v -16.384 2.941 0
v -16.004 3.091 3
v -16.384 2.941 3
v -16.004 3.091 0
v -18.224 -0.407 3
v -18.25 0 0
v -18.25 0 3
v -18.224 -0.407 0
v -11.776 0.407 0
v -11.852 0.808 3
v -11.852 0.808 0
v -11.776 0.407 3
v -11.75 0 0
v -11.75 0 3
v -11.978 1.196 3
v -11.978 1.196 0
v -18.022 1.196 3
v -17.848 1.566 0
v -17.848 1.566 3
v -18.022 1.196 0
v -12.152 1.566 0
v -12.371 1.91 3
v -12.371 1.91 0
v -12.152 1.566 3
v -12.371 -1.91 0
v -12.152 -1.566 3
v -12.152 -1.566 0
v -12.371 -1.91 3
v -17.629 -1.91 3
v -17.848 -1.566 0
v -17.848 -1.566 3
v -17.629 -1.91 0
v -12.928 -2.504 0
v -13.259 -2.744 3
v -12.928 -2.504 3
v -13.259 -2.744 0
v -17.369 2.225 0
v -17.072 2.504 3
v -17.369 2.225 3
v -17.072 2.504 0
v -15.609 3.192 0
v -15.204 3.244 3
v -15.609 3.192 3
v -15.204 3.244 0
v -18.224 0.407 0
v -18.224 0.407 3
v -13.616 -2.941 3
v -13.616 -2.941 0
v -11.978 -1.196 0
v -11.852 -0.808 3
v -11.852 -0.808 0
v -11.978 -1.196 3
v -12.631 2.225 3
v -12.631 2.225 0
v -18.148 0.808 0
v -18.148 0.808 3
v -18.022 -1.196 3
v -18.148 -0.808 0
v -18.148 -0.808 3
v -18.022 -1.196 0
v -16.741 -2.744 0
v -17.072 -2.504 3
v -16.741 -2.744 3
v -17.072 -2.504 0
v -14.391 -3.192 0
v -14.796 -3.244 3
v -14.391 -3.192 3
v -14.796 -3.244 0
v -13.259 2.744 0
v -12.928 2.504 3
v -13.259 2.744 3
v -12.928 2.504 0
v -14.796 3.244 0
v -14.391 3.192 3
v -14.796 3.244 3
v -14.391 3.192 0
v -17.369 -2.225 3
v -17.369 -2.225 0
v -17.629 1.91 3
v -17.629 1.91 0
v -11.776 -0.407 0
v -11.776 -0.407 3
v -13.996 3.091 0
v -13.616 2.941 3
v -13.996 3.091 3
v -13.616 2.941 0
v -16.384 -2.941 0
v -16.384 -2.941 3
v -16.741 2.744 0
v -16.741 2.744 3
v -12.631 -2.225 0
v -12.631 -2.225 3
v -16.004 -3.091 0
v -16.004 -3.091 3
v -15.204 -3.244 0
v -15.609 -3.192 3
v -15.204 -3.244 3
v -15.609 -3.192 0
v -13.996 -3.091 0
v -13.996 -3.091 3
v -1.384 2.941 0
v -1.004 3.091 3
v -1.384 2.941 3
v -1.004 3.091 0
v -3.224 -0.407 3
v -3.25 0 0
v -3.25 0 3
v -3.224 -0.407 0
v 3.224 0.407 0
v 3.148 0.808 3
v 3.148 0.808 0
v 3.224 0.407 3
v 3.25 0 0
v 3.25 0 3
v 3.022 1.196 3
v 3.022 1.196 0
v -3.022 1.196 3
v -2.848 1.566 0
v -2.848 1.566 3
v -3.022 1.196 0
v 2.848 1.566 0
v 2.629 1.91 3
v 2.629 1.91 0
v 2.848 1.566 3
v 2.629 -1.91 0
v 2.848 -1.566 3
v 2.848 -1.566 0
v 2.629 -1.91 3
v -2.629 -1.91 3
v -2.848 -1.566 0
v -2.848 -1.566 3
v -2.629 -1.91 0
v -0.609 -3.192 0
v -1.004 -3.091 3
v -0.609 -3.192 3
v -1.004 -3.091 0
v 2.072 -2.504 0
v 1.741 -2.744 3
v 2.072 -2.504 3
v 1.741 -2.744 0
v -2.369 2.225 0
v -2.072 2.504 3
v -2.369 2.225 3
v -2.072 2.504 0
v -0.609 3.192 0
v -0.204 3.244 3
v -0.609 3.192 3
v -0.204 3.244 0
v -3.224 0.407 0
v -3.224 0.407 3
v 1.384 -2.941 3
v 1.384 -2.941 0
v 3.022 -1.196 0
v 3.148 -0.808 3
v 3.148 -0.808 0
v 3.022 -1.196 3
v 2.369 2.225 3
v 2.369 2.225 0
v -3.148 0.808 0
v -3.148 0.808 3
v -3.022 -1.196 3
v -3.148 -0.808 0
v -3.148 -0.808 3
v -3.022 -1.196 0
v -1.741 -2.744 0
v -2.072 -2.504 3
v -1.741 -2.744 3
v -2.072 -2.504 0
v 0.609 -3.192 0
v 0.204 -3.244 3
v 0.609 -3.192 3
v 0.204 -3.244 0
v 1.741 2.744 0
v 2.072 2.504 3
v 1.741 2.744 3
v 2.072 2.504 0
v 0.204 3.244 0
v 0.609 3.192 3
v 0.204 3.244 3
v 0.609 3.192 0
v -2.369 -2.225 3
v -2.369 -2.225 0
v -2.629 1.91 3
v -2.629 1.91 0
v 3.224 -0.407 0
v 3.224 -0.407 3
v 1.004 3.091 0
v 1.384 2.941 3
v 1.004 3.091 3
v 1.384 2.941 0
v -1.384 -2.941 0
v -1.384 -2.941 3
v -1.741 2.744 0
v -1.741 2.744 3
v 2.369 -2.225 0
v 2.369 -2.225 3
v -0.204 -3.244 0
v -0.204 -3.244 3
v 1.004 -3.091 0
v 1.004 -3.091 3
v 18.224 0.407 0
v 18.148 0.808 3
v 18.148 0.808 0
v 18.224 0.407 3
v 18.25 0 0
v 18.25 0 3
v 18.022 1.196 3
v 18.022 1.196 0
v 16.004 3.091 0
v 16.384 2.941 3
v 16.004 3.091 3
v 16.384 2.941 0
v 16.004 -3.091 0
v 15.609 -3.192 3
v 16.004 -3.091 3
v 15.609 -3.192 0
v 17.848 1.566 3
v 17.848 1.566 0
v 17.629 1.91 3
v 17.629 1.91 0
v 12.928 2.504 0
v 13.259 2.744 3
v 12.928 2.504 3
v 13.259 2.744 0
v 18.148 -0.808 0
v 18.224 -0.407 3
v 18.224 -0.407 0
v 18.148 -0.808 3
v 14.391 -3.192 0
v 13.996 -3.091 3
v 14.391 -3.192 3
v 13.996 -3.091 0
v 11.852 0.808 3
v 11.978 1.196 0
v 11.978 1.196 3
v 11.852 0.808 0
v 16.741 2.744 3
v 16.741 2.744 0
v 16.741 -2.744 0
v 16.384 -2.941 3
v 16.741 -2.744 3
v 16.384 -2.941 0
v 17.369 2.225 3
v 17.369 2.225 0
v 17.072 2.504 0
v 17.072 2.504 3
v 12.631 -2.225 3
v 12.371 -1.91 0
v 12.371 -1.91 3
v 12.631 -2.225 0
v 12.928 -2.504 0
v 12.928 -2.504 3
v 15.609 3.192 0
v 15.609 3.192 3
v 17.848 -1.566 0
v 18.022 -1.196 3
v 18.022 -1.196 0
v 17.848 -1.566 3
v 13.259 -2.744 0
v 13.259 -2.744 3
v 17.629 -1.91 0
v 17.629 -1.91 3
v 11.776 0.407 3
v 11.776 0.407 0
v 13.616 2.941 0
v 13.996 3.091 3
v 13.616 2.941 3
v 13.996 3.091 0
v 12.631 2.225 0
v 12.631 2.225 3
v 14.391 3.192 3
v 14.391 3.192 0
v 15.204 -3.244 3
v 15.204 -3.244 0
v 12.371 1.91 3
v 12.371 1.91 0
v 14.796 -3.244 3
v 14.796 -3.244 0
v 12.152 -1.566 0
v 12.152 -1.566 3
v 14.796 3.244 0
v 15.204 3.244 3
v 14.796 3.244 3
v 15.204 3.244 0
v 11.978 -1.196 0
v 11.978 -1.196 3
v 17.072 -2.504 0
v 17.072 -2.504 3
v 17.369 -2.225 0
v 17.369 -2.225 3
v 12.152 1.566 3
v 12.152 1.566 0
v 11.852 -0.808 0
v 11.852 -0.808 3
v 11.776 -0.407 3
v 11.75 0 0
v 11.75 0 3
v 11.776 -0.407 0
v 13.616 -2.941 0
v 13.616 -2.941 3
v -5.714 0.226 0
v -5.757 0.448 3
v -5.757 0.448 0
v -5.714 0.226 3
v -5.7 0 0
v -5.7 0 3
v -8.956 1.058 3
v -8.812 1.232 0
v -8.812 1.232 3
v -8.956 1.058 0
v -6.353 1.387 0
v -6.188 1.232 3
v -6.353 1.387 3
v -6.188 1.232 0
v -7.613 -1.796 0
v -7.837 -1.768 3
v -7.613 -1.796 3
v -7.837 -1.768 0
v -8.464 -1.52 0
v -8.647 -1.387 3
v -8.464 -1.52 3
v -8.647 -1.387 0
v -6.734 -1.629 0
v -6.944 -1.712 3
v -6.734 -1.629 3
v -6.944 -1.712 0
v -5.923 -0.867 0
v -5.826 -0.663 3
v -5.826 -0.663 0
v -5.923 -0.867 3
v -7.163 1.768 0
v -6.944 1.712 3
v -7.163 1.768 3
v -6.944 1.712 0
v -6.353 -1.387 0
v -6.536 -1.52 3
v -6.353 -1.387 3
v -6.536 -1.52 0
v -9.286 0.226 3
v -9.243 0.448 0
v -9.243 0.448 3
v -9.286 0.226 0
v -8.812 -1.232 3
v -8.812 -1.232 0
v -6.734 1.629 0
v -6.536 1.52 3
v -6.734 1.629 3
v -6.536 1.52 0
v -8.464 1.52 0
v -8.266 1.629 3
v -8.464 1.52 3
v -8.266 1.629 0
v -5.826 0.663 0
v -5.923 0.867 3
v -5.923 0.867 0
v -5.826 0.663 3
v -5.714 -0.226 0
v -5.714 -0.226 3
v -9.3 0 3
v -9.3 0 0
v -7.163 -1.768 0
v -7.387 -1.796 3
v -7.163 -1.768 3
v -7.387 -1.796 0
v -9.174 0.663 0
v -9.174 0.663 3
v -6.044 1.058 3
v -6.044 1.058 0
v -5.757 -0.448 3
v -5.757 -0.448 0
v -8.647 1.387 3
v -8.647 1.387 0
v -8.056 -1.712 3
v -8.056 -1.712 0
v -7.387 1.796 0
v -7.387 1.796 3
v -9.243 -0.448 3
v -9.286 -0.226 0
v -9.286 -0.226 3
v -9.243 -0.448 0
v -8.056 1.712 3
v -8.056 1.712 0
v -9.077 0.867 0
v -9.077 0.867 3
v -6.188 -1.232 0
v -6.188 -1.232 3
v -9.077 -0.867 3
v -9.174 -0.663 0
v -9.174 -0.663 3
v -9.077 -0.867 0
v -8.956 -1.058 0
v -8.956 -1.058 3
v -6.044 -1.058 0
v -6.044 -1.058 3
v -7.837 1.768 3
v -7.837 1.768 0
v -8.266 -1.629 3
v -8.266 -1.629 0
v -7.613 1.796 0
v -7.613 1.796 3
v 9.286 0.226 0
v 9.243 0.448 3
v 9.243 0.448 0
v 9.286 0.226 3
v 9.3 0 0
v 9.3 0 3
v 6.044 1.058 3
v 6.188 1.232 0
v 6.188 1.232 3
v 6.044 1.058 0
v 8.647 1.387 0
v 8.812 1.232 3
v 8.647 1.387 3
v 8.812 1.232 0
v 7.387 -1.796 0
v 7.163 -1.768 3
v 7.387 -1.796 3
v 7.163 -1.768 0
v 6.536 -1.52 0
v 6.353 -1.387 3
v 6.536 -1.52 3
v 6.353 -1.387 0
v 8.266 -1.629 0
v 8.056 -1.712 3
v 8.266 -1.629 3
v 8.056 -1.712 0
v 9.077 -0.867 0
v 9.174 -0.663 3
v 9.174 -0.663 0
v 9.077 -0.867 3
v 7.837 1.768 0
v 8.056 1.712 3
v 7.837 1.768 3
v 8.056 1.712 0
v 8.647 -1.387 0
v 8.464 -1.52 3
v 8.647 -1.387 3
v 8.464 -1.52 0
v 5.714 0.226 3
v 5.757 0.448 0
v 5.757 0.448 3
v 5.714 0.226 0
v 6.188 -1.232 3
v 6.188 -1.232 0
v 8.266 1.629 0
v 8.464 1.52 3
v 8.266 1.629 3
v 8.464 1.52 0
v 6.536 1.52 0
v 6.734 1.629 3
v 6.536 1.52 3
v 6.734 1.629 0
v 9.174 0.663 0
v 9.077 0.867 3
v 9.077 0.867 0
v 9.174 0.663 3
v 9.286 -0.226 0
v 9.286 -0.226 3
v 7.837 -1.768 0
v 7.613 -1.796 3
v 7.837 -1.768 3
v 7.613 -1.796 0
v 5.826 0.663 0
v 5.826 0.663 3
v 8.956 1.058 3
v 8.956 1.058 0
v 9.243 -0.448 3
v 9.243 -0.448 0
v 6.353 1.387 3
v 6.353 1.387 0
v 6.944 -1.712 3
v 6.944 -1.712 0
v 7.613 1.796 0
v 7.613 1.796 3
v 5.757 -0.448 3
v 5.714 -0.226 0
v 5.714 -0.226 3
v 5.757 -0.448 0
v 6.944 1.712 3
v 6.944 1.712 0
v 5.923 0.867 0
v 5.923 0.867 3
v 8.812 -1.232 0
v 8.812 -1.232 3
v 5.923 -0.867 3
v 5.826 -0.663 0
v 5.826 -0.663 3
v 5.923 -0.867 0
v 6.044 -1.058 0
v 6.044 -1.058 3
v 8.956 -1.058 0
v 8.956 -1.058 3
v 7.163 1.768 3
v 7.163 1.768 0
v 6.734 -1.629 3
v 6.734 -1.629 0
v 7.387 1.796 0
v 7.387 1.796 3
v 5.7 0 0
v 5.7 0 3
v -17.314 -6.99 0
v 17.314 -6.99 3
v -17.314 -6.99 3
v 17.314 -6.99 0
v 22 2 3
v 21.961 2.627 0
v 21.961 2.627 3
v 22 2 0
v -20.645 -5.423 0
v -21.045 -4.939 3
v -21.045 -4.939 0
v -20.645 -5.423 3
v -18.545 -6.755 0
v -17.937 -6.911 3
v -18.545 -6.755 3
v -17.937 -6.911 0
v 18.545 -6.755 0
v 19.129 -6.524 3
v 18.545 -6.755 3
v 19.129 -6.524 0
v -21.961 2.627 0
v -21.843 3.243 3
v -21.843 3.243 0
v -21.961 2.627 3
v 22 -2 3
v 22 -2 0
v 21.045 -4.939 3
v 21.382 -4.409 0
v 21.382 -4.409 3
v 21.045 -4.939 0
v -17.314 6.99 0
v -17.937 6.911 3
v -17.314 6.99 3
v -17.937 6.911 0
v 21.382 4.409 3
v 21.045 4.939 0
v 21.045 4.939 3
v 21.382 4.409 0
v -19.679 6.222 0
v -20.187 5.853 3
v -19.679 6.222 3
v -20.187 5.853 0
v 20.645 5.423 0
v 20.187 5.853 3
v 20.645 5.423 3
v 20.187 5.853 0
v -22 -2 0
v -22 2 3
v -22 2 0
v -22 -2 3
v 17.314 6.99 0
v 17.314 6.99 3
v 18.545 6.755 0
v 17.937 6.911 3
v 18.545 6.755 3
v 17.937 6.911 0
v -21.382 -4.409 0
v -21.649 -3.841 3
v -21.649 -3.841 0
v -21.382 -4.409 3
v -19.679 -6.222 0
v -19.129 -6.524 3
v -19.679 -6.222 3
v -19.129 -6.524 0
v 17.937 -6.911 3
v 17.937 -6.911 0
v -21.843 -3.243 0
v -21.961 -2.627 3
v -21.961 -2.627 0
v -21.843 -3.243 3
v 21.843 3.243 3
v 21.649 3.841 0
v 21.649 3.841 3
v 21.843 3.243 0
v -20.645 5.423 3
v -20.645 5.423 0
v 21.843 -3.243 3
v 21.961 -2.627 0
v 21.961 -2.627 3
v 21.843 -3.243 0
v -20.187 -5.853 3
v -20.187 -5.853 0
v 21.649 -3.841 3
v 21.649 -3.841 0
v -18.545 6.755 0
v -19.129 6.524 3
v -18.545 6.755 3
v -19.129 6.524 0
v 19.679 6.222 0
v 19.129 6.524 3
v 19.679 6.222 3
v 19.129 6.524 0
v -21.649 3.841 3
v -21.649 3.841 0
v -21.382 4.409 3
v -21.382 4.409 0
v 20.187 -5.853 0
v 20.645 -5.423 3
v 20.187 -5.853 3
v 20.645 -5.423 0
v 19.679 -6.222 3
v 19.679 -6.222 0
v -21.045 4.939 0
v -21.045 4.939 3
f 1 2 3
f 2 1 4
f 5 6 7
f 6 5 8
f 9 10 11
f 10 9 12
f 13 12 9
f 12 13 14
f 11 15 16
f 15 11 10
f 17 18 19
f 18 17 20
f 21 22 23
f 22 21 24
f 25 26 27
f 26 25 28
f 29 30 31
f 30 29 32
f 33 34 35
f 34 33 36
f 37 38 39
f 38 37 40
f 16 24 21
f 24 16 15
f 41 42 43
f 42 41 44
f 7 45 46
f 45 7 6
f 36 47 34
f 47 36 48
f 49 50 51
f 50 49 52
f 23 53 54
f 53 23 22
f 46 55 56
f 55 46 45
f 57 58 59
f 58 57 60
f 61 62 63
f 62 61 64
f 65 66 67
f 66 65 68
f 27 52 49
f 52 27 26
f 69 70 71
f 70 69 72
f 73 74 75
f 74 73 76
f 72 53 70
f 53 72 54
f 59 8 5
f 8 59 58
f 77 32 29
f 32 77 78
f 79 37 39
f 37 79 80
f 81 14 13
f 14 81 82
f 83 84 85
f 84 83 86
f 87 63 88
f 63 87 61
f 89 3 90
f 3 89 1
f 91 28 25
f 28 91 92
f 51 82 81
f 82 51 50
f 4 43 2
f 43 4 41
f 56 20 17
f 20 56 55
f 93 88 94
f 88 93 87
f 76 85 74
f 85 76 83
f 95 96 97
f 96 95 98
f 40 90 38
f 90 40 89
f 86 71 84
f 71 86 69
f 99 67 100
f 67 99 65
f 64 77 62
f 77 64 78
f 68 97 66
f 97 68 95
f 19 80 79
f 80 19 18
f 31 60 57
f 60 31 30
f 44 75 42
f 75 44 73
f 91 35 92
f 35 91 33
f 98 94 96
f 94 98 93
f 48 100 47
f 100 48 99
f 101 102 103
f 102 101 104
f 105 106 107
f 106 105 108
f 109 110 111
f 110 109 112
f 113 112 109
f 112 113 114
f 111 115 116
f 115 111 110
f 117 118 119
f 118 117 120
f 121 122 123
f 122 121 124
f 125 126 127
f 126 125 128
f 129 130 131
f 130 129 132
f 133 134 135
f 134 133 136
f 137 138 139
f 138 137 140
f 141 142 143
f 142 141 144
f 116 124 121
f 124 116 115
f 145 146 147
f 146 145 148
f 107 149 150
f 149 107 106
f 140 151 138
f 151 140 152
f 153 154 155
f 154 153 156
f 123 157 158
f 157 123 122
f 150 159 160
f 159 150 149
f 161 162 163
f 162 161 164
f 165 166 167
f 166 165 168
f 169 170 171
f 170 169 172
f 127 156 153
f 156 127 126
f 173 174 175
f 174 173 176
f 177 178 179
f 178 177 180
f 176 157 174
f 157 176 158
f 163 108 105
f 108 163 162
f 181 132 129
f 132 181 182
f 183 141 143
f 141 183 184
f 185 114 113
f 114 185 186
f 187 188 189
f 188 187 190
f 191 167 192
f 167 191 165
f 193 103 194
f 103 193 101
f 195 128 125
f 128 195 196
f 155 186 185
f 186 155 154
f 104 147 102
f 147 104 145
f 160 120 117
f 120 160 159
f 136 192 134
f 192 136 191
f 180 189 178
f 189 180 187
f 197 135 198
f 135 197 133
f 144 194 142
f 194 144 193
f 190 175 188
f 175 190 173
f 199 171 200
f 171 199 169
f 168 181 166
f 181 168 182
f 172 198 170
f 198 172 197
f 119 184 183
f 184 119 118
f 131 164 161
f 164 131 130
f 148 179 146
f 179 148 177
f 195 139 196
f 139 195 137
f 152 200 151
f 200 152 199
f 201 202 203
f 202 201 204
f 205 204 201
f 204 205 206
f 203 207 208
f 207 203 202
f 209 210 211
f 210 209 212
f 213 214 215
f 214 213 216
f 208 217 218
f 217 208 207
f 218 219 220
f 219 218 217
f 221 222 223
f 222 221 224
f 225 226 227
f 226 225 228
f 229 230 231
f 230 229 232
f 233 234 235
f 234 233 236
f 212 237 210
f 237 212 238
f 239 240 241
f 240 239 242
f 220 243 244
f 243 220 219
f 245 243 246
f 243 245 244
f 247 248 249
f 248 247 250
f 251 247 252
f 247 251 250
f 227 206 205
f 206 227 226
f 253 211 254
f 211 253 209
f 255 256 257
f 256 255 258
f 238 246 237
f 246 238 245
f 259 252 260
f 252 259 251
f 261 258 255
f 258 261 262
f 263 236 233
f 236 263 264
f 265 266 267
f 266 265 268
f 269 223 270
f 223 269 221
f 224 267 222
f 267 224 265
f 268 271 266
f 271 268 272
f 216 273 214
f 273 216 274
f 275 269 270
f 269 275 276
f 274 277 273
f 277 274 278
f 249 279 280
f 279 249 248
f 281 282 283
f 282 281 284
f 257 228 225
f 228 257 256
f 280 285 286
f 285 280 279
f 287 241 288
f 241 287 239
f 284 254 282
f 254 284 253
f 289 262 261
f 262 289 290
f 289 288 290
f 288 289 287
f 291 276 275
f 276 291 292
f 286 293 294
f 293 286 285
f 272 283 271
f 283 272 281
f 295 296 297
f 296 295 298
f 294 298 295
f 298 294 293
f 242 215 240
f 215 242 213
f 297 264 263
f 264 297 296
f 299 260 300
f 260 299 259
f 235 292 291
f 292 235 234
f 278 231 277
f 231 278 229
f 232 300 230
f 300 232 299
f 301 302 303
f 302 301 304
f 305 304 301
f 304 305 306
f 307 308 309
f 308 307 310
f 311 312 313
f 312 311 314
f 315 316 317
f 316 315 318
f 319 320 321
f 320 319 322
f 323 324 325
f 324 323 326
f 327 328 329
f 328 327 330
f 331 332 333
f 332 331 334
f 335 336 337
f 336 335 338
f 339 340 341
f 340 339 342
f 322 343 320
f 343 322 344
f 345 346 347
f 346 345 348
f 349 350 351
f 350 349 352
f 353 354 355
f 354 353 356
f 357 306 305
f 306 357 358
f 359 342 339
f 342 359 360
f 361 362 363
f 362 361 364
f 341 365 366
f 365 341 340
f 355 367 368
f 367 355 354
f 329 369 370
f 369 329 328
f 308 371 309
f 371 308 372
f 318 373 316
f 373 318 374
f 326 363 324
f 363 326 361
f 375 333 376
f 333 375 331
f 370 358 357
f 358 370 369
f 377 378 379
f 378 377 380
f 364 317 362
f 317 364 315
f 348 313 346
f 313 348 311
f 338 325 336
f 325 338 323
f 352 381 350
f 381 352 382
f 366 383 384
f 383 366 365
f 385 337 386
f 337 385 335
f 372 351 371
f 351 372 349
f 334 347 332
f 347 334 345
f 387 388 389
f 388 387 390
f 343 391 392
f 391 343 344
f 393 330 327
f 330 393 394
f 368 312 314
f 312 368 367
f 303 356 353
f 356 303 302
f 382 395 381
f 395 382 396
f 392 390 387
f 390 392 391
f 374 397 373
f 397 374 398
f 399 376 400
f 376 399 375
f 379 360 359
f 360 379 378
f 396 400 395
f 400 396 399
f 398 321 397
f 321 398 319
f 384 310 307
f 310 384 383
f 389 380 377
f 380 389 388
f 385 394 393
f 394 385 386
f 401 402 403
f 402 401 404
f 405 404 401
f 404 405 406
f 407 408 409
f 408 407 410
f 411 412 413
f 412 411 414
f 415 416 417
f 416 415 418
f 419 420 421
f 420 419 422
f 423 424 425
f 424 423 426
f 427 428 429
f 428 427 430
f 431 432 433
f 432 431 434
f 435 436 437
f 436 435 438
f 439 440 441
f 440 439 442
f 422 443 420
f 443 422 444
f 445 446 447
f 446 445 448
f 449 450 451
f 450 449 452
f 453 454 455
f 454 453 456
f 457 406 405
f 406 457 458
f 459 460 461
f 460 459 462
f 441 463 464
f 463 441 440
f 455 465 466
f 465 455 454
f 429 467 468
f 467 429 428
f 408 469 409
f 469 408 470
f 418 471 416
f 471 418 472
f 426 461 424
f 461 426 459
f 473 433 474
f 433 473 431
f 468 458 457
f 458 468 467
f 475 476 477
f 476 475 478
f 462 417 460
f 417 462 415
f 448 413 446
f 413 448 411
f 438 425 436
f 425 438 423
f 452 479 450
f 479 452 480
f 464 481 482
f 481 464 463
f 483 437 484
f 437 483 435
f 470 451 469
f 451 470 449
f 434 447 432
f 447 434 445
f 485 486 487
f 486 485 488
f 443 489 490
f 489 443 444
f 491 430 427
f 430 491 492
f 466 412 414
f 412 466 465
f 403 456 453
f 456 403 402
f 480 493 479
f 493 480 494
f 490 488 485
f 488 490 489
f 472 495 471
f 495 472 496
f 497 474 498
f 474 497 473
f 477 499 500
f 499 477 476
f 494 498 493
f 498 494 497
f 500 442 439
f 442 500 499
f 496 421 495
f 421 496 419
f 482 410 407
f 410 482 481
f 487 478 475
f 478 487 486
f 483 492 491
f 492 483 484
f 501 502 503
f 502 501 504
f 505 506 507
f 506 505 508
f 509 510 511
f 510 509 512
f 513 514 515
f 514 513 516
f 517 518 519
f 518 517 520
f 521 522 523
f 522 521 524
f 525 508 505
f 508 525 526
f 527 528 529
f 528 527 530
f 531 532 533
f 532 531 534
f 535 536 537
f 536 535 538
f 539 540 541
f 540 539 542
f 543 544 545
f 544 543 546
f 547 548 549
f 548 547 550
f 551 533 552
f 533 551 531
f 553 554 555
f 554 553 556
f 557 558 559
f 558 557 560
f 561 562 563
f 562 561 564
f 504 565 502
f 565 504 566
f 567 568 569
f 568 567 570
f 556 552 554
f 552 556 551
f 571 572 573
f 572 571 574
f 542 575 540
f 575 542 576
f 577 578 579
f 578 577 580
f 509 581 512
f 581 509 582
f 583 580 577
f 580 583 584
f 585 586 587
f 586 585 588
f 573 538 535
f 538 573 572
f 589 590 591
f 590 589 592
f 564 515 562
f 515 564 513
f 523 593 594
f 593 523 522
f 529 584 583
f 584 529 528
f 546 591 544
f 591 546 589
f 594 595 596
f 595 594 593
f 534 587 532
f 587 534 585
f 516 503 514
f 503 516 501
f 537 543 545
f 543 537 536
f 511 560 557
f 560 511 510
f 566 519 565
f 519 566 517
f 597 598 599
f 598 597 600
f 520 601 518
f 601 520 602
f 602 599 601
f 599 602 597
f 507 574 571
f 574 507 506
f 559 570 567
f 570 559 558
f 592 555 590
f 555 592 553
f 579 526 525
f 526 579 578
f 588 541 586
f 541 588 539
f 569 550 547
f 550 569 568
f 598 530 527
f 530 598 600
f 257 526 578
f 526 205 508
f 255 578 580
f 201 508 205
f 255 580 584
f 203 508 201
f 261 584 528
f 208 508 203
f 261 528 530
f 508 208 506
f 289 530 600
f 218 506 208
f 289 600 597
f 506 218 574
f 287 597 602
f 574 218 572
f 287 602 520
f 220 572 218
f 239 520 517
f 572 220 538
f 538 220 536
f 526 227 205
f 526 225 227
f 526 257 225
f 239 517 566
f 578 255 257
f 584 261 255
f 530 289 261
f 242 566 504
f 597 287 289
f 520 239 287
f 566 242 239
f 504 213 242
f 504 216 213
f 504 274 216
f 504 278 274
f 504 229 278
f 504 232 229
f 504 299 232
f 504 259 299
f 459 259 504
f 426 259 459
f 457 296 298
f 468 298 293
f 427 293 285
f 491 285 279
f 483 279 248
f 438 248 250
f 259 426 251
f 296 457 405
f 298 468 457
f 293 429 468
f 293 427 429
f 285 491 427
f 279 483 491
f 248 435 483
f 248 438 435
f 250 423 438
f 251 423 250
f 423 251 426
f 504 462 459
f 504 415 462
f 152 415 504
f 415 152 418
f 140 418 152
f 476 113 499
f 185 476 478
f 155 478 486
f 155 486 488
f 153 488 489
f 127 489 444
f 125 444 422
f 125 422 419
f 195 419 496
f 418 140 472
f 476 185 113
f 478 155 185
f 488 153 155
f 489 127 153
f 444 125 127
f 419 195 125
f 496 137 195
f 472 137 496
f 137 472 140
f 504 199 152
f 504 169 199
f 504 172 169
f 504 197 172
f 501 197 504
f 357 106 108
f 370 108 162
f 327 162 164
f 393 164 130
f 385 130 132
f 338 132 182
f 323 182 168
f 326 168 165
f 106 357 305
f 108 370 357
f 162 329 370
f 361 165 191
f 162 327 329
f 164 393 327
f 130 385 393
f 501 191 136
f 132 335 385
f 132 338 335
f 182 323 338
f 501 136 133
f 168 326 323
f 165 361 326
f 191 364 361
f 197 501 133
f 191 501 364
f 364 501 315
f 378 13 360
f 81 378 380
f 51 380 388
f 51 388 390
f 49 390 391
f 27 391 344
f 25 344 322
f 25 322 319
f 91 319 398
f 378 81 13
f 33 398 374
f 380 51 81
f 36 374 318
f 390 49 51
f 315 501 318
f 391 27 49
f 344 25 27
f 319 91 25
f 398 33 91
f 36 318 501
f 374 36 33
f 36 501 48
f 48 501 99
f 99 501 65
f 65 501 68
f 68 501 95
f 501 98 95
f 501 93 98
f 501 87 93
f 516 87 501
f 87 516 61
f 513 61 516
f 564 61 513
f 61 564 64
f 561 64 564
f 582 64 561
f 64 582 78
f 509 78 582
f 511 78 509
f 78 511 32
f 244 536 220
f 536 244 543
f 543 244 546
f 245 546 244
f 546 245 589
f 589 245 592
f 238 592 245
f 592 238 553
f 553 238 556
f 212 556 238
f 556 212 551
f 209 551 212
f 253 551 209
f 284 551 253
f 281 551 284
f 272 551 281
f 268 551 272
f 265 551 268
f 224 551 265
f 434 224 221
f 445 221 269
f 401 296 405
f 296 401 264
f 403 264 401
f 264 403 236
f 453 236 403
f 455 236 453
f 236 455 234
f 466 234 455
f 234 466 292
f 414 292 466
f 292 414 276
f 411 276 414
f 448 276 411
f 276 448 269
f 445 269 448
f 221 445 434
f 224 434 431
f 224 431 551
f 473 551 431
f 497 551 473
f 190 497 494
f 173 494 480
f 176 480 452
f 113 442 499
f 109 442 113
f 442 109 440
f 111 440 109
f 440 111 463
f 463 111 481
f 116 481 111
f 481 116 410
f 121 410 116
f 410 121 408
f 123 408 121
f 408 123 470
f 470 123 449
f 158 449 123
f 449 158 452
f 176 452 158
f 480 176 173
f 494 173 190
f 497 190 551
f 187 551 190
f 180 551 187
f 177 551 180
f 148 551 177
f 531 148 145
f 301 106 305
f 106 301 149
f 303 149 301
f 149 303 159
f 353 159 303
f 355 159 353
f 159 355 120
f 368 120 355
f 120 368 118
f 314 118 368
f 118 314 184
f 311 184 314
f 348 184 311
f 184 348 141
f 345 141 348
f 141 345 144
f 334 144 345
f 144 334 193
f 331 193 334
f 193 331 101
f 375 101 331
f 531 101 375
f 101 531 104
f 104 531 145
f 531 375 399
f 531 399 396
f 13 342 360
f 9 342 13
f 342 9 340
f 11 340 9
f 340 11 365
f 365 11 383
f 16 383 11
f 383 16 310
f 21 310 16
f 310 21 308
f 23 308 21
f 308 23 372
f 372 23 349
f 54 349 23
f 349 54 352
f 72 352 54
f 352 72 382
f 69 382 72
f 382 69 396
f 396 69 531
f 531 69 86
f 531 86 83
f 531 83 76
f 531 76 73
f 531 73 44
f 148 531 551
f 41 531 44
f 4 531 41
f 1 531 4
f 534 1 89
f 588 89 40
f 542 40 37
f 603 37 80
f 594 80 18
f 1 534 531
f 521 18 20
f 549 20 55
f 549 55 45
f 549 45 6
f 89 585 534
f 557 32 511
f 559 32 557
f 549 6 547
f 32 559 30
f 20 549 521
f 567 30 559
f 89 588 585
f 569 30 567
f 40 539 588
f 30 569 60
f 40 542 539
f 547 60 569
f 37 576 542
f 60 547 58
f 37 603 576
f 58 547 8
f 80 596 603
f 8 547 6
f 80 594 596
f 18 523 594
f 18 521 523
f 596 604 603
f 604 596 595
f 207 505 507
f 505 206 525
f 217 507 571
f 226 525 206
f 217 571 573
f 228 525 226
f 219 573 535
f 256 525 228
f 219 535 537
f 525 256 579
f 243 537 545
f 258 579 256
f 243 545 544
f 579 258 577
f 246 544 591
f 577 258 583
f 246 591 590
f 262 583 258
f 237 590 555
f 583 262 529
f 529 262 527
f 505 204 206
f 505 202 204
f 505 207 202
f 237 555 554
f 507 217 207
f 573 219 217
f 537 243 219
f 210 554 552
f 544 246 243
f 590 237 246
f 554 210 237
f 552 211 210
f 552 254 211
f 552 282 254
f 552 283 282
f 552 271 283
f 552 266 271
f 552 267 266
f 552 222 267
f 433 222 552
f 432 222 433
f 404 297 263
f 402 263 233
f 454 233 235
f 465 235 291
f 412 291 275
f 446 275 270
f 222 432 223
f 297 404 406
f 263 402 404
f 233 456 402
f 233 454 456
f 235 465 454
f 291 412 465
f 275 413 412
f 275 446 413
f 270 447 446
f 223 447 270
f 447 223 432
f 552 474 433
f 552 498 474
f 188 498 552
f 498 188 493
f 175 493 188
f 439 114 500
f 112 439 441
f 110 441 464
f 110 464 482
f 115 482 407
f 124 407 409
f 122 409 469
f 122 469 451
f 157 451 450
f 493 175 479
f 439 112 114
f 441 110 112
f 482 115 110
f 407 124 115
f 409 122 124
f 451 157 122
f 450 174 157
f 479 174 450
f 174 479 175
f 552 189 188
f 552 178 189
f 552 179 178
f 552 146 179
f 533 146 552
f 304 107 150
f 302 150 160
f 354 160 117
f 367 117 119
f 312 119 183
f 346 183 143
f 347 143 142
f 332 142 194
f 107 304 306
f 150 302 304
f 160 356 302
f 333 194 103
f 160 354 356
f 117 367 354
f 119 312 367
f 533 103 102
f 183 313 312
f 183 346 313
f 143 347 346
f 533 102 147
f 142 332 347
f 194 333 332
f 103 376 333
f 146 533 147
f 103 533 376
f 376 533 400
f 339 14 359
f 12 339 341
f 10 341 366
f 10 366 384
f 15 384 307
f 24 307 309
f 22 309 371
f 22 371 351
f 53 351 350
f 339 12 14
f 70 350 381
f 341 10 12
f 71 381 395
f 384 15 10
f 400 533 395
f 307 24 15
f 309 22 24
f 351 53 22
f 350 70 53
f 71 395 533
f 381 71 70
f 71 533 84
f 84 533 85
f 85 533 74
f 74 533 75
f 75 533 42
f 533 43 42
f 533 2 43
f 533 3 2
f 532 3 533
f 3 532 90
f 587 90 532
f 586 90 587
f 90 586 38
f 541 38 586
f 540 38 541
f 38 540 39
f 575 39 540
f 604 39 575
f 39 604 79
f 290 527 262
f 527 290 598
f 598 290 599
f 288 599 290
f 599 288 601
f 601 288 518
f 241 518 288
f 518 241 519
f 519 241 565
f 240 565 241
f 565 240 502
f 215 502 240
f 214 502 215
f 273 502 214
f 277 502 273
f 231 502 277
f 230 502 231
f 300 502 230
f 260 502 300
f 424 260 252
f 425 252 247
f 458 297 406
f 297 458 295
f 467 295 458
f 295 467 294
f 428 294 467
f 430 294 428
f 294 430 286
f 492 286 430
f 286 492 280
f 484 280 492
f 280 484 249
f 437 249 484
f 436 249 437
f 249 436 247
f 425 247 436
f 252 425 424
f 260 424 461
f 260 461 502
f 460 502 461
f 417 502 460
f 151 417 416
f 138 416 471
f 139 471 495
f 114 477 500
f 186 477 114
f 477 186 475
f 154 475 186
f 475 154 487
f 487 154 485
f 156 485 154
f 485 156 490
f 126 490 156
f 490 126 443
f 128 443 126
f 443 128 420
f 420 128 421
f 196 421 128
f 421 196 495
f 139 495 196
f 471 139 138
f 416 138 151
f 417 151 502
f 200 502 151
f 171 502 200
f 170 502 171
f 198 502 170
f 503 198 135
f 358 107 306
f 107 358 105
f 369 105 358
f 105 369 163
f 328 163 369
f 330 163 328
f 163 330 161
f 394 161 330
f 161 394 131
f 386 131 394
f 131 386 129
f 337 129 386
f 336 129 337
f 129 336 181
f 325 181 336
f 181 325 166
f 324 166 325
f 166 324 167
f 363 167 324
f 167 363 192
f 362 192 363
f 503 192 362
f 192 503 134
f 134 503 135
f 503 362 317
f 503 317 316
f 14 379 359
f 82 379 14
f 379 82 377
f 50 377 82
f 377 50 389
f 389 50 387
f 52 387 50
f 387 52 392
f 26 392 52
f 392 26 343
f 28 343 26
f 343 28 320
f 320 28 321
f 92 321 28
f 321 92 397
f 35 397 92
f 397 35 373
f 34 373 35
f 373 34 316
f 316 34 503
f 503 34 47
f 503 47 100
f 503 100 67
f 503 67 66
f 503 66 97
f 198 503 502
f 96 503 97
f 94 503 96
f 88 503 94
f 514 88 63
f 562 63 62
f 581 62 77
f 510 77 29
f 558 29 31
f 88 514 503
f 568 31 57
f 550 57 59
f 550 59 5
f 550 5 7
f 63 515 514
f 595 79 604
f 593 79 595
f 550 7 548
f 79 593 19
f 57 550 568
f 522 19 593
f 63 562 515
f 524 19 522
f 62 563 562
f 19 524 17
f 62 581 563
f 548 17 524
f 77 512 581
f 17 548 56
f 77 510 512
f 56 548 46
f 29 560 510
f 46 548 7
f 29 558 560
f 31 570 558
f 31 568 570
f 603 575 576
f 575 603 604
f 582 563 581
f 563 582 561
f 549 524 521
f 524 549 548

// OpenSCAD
$fn = 50;


difference() {
	union() {
		*color(alpha = 1.0000000000, c = "gray") {
			translate(v = [0, 7, 0]) {
				linear_extrude(height = 1) {
					text(font = "Arial:style=Bold", halign = "center", size = 4.5000000000, text = "COMMENT plate main", valign = "center");
				}
			}
		}
		*color(alpha = 1.0000000000, c = "gray") {
			translate(v = [0, 14, 0]) {
				linear_extrude(height = 1) {
					text(font = "Arial:style=Bold", halign = "center", size = 4.5000000000, text = "COMMENT description oobb_plate_shape_p_type_3_depth_3_width_1_height_3_thickness_true_both_holes", valign = "center");
				}
			}
		}
		hull() {
			translate(v = [-17.0000000000, 2.0000000000, 0]) {
				cylinder(h = 3, r = 5);
			}
			translate(v = [17.0000000000, 2.0000000000, 0]) {
				cylinder(h = 3, r = 5);
			}
			translate(v = [-17.0000000000, -2.0000000000, 0]) {
				cylinder(h = 3, r = 5);
			}
			translate(v = [17.0000000000, -2.0000000000, 0]) {
				cylinder(h = 3, r = 5);
			}
		}
	}
	union() {
		*color(alpha = 1.0000000000, c = "gray") {
			translate(v = [0, 7, 0]) {
				linear_extrude(height = 1) {
					text(font = "Arial:style=Bold", halign = "center", size = 4.5000000000, text = "COMMENT holes main", valign = "center");
				}
			}
		}
		*color(alpha = 1.0000000000, c = "gray") {
			translate(v = [0, 14, 0]) {
				linear_extrude(height = 1) {
					text(font = "Arial:style=Bold", halign = "center", size = 4.5000000000, text = "COMMENT description oobb_holes_shape_n_type_3_width_1_height_3_thickness_true_both_holes", valign = "center");
				}
			}
		}
		translate(v = [-15.0000000000, 0.0000000000, 0]) {
			translate(v = [0, 0, -50]) {
				cylinder(h = 100, r = 3.2500000000);
			}
		}
		translate(v = [0, 0, -50]) {
			cylinder(h = 100, r = 3.2500000000);
		}
		translate(v = [15.0000000000, 0.0000000000, 0]) {
			translate(v = [0, 0, -50]) {
				cylinder(h = 100, r = 3.2500000000);
			}
		}
		translate(v = [-15.0000000000, 0.0000000000, 0]) {
			translate(v = [0, 0, -50]) {
				cylinder(h = 100, r = 1.8000000000);
			}
		}
		translate(v = [-7.5000000000, 0.0000000000, 0]) {
			translate(v = [0, 0, -50]) {
				cylinder(h = 100, r = 1.8000000000);
			}
		}
		translate(v = [0, 0, -50]) {
			cylinder(h = 100, r = 1.8000000000);
		}
		translate(v = [7.5000000000, 0.0000000000, 0]) {
			translate(v = [0, 0, -50]) {
				cylinder(h = 100, r = 1.8000000000);
			}
		}
		translate(v = [15.0000000000, 0.0000000000, 0]) {
			translate(v = [0, 0, -50]) {
				cylinder(h = 100, r = 1.8000000000);
			}
		}
	}
}
